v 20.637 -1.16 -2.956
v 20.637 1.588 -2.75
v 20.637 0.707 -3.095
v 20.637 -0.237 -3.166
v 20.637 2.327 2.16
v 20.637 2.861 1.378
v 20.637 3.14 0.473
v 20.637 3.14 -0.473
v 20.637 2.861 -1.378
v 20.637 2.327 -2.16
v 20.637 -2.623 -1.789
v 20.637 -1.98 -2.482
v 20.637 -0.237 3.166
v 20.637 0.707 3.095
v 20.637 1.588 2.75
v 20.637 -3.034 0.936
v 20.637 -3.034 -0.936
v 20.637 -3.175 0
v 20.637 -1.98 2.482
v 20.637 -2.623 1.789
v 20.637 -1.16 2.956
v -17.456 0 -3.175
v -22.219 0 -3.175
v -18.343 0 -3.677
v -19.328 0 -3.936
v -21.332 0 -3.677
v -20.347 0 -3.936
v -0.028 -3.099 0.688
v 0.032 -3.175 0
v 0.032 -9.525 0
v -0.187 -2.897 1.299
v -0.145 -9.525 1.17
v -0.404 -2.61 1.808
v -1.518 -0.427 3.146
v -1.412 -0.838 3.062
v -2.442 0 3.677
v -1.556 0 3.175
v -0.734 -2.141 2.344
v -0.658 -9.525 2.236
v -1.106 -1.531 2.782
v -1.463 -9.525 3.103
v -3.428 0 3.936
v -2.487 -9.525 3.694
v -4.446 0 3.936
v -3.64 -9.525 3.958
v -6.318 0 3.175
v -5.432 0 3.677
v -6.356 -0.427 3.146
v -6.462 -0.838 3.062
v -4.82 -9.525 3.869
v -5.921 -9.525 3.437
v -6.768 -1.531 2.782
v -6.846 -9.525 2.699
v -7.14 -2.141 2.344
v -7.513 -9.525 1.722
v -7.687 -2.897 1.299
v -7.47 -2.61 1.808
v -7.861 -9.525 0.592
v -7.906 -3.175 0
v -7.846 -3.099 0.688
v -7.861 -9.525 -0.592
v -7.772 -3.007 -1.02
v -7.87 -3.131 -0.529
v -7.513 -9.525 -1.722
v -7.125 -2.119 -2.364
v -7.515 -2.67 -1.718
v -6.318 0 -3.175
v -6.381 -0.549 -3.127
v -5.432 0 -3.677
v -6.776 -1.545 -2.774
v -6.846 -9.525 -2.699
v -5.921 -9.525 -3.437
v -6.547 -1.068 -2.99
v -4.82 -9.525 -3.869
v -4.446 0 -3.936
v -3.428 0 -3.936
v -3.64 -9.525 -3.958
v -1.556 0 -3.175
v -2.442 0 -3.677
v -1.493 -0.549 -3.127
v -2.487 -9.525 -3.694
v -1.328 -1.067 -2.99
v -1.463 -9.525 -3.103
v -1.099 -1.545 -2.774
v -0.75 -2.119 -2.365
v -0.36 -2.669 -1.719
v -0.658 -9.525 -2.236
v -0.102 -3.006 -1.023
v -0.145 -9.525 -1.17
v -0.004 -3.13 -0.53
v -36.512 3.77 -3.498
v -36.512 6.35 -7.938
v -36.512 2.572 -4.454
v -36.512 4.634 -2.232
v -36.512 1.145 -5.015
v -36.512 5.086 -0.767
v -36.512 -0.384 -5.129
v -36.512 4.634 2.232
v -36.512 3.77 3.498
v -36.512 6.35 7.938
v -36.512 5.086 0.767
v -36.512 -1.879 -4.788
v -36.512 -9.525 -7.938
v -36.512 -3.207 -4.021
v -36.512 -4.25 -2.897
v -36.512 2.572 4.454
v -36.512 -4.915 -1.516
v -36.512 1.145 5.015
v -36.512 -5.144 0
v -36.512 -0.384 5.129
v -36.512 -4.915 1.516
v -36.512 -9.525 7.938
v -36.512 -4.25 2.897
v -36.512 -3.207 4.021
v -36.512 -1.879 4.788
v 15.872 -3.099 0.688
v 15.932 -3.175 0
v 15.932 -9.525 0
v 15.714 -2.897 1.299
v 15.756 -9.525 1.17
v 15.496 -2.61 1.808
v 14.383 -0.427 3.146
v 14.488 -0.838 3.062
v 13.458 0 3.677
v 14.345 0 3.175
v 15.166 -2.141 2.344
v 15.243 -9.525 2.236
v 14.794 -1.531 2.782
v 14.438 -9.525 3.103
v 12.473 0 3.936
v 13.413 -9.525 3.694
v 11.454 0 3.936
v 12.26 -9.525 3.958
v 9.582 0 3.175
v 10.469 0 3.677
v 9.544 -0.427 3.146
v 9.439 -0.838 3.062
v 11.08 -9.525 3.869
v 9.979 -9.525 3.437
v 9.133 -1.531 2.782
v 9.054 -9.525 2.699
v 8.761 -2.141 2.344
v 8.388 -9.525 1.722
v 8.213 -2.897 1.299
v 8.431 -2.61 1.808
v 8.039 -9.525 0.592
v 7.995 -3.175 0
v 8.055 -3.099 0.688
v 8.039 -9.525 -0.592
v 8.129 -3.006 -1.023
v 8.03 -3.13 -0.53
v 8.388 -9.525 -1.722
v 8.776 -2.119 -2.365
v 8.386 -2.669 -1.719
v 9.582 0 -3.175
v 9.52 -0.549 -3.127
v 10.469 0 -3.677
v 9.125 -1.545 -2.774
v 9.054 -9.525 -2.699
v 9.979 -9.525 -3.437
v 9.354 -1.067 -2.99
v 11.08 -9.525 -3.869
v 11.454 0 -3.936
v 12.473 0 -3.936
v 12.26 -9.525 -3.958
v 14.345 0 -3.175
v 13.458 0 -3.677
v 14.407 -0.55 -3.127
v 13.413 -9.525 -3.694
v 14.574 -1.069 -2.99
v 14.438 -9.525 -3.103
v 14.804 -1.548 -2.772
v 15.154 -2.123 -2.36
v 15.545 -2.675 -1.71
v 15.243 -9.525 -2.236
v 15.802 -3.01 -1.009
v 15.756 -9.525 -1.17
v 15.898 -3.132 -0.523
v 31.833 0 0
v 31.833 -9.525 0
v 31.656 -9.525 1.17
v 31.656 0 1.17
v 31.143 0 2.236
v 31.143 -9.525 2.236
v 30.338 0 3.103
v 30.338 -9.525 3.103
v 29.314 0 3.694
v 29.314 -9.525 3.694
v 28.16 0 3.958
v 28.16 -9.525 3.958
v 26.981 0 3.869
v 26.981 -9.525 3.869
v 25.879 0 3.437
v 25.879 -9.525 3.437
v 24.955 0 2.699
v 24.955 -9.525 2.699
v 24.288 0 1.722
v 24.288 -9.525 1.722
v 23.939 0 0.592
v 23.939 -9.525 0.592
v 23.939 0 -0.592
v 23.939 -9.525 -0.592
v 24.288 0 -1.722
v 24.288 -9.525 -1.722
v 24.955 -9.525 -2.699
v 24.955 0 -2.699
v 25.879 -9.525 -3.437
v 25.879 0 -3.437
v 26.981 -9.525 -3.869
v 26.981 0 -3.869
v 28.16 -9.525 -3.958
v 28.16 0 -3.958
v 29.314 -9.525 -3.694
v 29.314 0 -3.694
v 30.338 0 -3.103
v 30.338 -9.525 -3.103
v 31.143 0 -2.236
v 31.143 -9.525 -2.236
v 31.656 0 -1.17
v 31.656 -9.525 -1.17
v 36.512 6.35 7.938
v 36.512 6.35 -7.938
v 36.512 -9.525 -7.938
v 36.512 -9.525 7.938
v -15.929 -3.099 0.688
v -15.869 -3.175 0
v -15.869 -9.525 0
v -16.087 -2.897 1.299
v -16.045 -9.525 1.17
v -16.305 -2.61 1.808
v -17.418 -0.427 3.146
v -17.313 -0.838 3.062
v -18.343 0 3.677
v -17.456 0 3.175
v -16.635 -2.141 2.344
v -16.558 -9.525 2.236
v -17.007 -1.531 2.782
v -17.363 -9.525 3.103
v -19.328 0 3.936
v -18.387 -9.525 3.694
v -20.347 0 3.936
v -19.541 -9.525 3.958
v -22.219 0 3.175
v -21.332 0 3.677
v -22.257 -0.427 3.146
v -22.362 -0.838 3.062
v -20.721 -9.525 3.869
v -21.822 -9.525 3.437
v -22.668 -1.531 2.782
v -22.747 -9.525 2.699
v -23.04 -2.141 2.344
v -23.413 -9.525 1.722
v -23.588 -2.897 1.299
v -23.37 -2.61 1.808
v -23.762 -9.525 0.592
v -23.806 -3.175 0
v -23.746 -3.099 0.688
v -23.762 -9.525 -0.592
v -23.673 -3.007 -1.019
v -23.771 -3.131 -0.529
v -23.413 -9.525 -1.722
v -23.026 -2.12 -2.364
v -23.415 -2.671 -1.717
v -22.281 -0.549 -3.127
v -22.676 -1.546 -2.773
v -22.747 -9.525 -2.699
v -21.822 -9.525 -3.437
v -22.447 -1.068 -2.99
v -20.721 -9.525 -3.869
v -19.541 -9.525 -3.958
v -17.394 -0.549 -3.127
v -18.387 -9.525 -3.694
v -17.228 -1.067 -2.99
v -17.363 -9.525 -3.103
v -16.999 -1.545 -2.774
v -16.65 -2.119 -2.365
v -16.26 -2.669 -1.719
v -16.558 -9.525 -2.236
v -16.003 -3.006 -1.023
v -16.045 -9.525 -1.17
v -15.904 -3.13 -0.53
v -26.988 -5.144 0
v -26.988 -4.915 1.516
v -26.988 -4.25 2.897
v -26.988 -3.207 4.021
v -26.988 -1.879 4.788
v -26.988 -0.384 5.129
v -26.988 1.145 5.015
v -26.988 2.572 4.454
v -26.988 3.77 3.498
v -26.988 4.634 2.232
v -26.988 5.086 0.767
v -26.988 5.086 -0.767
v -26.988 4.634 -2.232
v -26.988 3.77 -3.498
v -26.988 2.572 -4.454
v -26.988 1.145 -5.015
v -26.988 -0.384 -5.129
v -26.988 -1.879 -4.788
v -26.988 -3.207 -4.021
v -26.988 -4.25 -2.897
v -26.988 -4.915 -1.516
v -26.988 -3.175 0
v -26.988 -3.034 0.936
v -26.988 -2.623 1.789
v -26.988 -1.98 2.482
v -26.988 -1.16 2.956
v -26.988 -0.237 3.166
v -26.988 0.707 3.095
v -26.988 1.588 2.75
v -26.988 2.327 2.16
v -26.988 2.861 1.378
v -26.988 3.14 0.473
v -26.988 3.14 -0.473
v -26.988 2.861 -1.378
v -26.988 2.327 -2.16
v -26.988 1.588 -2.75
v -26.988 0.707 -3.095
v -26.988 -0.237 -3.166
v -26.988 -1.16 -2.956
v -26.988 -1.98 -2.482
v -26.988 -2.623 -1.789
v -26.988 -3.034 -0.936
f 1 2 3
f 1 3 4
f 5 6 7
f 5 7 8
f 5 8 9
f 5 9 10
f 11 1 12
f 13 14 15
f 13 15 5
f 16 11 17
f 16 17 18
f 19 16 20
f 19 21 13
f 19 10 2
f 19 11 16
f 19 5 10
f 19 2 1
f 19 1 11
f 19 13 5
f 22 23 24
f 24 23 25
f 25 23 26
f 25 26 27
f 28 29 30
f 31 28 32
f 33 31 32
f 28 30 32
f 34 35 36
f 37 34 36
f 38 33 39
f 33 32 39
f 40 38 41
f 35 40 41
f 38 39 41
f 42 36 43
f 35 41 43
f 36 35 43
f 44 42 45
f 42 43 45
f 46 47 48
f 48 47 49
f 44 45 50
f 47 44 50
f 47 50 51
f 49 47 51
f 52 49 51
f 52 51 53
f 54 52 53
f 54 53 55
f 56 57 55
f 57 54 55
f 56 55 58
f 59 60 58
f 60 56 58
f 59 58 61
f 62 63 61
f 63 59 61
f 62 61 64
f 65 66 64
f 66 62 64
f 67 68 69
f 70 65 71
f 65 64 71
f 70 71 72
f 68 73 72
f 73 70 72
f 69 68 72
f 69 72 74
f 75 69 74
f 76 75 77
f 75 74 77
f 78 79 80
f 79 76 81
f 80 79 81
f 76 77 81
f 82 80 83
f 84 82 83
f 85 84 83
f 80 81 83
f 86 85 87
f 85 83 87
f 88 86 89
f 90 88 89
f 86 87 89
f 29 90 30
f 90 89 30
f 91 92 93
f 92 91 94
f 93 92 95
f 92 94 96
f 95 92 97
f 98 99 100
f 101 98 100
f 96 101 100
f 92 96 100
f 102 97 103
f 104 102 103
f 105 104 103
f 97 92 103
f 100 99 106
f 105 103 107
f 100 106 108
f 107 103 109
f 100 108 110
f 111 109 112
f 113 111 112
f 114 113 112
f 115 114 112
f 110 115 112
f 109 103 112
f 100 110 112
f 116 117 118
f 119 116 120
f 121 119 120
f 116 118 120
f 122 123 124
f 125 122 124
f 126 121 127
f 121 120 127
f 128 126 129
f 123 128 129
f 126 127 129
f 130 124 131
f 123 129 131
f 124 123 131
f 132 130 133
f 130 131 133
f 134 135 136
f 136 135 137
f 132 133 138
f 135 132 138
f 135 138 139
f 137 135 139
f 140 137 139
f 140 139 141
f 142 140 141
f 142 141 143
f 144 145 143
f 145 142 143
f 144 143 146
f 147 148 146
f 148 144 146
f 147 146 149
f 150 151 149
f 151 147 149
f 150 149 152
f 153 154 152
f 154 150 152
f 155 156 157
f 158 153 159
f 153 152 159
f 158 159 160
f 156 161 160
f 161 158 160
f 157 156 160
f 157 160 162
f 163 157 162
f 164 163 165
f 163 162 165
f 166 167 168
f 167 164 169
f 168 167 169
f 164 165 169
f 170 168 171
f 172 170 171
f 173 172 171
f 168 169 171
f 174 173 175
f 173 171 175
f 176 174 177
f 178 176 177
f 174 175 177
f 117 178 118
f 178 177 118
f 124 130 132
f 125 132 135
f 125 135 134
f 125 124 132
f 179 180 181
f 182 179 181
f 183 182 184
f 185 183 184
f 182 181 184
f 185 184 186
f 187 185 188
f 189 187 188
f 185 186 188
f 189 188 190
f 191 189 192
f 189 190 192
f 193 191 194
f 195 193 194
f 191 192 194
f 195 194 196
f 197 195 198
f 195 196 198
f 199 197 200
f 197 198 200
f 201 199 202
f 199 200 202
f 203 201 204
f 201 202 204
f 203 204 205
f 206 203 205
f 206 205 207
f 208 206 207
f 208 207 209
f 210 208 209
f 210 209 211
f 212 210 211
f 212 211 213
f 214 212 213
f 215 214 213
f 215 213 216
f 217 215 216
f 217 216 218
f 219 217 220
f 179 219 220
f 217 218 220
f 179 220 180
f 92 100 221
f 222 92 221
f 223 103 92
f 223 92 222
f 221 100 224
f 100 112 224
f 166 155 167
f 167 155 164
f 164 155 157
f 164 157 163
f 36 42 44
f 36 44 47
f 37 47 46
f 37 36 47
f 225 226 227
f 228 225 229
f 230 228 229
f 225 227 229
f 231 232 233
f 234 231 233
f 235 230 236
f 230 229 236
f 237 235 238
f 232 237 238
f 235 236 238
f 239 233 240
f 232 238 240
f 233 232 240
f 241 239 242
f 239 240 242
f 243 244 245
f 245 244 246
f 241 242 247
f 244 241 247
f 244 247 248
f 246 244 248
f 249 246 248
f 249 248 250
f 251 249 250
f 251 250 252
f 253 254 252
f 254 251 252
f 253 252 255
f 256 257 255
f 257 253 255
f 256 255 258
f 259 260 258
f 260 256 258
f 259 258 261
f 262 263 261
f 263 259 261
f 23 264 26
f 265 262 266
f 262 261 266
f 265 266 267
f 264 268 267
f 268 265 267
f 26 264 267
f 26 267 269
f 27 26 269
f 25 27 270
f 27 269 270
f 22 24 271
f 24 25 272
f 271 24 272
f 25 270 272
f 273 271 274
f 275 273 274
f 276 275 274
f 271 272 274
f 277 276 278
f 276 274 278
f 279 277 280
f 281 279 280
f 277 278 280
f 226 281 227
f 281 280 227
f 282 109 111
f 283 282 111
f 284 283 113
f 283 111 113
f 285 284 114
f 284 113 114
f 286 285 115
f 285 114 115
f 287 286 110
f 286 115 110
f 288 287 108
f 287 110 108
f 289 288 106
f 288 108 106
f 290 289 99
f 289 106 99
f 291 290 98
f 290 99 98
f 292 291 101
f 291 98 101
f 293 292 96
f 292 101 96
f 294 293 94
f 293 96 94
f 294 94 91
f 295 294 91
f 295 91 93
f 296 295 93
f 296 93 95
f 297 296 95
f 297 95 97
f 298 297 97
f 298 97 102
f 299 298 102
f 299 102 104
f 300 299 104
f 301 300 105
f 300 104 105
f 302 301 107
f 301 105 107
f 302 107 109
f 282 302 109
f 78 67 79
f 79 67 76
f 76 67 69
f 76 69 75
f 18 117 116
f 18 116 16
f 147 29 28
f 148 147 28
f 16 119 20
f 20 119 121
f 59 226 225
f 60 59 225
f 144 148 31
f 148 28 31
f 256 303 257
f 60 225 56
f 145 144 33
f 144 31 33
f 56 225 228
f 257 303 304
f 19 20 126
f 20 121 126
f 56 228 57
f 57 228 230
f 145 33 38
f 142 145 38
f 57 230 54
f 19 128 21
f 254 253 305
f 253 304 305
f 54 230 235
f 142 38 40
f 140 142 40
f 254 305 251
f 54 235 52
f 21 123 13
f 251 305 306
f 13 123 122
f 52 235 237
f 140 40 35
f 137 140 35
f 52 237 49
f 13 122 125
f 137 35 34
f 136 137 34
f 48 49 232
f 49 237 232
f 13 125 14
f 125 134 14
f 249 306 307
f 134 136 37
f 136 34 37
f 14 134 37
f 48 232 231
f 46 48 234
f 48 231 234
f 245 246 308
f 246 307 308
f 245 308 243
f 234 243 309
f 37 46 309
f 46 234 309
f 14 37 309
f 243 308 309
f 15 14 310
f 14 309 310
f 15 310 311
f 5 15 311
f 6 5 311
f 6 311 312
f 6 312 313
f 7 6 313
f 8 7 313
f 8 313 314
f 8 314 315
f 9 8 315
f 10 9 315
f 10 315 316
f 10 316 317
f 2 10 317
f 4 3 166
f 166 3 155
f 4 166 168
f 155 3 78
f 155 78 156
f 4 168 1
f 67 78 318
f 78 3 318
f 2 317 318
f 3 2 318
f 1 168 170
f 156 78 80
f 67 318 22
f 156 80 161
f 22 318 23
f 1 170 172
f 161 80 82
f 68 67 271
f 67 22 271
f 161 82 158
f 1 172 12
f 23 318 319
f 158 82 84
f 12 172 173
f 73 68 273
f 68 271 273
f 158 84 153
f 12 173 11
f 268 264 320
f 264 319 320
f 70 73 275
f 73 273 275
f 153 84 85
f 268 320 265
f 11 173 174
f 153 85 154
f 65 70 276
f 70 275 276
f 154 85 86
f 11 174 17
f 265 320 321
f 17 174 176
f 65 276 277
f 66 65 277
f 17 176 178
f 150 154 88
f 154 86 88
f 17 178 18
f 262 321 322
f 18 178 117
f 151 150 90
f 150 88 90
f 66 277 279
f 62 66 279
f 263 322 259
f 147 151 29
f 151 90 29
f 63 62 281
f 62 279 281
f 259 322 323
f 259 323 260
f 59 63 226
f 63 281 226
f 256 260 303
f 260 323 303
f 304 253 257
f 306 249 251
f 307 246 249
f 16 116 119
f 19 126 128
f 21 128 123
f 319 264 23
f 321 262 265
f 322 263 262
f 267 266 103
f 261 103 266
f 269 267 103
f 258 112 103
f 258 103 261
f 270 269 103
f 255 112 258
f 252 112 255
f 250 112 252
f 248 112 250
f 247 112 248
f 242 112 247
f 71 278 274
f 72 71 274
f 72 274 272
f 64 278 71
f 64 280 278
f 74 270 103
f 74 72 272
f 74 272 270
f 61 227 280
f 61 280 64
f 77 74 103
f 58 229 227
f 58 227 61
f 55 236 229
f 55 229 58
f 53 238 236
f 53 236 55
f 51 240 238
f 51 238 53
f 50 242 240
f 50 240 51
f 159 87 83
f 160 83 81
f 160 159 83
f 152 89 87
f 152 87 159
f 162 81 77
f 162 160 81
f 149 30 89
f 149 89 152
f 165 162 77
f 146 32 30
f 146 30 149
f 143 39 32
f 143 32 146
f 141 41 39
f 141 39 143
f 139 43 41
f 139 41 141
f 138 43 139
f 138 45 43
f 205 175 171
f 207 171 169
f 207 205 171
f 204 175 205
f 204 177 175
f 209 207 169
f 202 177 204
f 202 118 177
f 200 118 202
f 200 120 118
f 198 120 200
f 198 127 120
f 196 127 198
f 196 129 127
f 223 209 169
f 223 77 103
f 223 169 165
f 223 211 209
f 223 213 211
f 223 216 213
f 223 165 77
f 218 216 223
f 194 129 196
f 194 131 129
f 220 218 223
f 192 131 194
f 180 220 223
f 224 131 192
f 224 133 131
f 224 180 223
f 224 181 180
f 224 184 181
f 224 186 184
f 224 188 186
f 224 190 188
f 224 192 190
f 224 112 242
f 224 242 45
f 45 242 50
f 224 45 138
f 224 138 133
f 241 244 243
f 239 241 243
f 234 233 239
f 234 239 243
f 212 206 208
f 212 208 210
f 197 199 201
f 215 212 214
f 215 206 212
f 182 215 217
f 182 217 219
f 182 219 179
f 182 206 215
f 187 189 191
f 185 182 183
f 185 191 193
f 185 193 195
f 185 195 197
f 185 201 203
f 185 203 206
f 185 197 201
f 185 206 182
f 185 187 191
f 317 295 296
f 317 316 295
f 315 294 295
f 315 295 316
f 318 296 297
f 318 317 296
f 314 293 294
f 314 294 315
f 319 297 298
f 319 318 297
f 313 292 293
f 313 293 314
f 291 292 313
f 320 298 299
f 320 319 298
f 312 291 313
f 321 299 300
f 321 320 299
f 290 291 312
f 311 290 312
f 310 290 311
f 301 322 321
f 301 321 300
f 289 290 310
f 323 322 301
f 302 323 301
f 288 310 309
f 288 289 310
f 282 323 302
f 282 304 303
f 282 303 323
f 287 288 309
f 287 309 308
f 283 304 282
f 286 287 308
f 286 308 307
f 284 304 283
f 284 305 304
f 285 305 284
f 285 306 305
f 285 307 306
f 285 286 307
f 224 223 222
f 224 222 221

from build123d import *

# Parameters (mm, degrees)
F0_W          = 73.025
F0_H          = 15.875
F1_DEPTH      = 9.525
F1_DEPTH_BACK = 6.35
F2_R          = 5.1435
F3_DEPTH      = 9.525
F4_R          = 3.175
F5_DEPTH      = 57.15
F6_R          = 3.96875
F7_DEPTH      = 9.525


with BuildPart() as f1:
    # F0 (on Front) → F1 (new body, two sides)
    with BuildSketch(Plane.XZ) as f1_sk:
        Rectangle(F0_W, F0_H)
    extrude(amount=F1_DEPTH)
    extrude(f1_sk.sketch, amount=-F1_DEPTH_BACK)

    # F2 (on face) → F3 (cut)
    with BuildSketch(Plane(origin=(-36.5125, 0, 0), x_dir=(0, -1, 0), z_dir=(-1, 0, 0))):
        Circle(F2_R)
    extrude(amount=-F3_DEPTH, mode=Mode.SUBTRACT)

    # F4 (on face) → F5 (cut)
    with BuildSketch(Plane(origin=(-36.5125, 0, 0), x_dir=(0, -1, 0), z_dir=(-1, 0, 0))):
        Circle(F4_R)
    extrude(amount=-F5_DEPTH, mode=Mode.SUBTRACT)

    # F6 (on face) → F7 (cut, through all)
    with BuildSketch(Plane.XZ.offset(9.525)):
        with Locations((-3.937, 0)):
            Circle(F6_R)
        with Locations((-19.8374, 0)):
            Circle(F6_R)
        with Locations((11.9634, 0)):
            Circle(F6_R)
        with Locations((27.8638, 0)):
            Circle(F6_R)
    extrude(amount=-F7_DEPTH, mode=Mode.SUBTRACT)


solid = f1.part
